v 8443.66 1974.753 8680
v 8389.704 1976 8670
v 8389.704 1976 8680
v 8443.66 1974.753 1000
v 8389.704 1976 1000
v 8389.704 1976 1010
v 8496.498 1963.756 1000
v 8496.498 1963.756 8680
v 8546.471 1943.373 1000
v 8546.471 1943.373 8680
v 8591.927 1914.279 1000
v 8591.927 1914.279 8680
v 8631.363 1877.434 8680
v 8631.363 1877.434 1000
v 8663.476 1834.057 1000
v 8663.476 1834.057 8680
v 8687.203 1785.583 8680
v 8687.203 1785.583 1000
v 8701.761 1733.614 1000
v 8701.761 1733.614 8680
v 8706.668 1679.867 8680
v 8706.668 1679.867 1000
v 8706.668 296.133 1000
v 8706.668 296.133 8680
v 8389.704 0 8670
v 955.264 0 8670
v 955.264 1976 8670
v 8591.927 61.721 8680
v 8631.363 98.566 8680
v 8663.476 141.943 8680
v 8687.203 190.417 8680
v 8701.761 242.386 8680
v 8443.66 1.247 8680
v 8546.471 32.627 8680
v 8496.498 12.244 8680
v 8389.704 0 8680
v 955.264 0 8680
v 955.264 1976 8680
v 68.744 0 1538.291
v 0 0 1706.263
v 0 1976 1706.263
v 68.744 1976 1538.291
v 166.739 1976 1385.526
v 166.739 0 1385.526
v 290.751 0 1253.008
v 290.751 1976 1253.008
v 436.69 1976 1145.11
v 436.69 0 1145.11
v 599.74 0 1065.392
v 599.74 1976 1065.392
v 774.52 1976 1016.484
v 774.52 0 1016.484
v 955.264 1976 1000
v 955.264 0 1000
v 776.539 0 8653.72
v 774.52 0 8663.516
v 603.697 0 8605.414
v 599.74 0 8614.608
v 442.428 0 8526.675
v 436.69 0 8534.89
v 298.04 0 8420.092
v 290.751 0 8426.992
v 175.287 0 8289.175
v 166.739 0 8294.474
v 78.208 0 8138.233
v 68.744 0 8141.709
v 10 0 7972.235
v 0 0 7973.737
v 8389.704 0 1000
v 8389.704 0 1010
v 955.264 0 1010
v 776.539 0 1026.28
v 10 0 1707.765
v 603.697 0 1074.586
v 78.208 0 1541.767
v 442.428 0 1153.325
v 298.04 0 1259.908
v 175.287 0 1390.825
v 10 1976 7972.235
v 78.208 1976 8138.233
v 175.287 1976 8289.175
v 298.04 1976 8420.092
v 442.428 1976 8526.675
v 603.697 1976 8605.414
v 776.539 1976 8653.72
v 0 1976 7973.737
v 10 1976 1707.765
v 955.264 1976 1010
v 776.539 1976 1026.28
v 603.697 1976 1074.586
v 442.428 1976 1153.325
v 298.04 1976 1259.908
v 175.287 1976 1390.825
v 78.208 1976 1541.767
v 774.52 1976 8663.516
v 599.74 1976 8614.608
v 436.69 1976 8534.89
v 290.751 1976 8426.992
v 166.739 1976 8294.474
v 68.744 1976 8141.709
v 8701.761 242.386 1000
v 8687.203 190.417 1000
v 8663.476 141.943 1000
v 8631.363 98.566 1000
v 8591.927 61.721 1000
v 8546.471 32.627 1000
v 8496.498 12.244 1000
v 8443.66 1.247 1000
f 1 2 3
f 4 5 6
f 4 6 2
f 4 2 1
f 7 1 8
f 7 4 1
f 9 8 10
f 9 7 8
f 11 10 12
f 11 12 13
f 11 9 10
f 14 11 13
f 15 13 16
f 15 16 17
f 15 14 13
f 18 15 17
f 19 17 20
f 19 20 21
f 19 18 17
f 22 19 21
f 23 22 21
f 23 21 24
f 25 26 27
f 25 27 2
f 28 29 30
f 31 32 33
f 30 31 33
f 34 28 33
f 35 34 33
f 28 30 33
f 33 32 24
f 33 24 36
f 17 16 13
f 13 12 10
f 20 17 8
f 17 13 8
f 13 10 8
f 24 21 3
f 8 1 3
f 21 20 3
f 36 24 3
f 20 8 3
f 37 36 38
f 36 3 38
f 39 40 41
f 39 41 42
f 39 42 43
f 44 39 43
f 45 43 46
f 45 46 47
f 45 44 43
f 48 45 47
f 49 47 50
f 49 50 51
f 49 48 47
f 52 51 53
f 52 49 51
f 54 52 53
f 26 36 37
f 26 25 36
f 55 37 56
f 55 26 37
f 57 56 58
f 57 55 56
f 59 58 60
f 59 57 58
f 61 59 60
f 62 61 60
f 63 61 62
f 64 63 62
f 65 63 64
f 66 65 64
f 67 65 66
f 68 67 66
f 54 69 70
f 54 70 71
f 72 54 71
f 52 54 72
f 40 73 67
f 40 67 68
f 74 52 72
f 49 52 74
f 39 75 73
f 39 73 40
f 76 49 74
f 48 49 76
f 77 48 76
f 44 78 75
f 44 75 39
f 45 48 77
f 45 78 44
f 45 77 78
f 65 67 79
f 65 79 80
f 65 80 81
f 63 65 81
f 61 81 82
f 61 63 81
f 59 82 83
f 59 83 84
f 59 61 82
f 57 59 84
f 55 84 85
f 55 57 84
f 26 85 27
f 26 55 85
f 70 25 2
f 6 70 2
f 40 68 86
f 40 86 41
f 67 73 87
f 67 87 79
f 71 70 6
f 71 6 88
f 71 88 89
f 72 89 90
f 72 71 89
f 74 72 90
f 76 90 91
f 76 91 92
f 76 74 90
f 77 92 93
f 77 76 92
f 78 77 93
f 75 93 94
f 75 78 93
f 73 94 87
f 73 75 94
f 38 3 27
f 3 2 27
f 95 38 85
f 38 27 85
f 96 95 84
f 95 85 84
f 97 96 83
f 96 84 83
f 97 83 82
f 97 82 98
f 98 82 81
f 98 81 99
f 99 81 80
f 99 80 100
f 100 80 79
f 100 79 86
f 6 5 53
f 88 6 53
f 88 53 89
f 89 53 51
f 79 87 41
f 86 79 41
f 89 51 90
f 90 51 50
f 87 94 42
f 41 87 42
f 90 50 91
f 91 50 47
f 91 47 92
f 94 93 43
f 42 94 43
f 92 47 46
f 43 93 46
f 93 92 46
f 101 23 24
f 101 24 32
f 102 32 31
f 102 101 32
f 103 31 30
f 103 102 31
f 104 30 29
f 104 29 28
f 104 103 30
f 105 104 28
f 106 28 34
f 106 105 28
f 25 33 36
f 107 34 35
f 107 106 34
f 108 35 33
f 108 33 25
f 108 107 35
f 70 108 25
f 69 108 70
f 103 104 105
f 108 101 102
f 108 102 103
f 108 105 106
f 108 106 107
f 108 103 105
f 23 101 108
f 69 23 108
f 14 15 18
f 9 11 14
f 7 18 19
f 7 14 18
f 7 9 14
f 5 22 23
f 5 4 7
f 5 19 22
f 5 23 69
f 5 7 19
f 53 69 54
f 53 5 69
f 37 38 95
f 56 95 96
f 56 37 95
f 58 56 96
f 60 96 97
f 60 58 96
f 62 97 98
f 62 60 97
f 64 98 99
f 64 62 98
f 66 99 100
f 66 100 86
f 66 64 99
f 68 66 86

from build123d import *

# Parameters (mm, degrees)
EXTRUDE_THIN1_DEPTH = 1976
BOSS_EXTRUDE1_DEPTH = 7680


with BuildPart() as part:
    # Sketch3 → Extrude-Thin1 (new body)
    with BuildSketch(Plane(origin=(0, 0, 0), x_dir=(1, 0, 0), z_dir=(0, 1, 0))):
        with BuildLine():
            Line((8389.704370421, -8680), (955.264370754, -8680))
            ThreePointArc((955.264370754, -8680), (361.265893237, -8484.261451204), (0, -7973.737480011))
            Line((0, -7973.737480011), (0, -1706.262519989))
            ThreePointArc((0, -1706.262519989), (361.265893237, -1195.738548796), (955.264370754, -1000))
            Line((955.264370754, -1000), (8389.704370421, -1000))
            Line((8389.704370421, -1000), (8389.704370421, -1010))
            Line((8389.704370421, -1010), (955.264370754, -1010))
            ThreePointArc((955.264370754, -1010), (367.812088707, -1203.335369926), (10, -1707.76500637))
            Line((10, -1707.76500637), (10, -7972.23499363))
            ThreePointArc((10, -7972.23499363), (367.812088707, -8476.664630074), (955.264370754, -8670))
            Line((955.264370754, -8670), (8389.704370421, -8670))
            Line((8389.704370421, -8670), (8389.704370421, -8680))
        make_face()
    extrude(amount=EXTRUDE_THIN1_DEPTH)

    # Sketch6 → Boss-Extrude1 (add)
    with BuildSketch(Plane(origin=(0, 0, 1000), x_dir=(-1, 0, 0), z_dir=(0, 0, -1))):
        with BuildLine():
            Line((-8706.667783767, 1679.867153644), (-8706.667783767, 296.132846356))
            ThreePointArc((-8706.667783767, 296.132846356), (-8612.48413892, 79.245509191), (-8389.704370421, 0))
            Line((-8389.704370421, 0), (-8389.704370421, 1976))
            ThreePointArc((-8389.704370421, 1976), (-8612.48413892, 1896.754490809), (-8706.667783767, 1679.867153644))
        make_face()
    extrude(amount=-BOSS_EXTRUDE1_DEPTH)


solid = part.part
